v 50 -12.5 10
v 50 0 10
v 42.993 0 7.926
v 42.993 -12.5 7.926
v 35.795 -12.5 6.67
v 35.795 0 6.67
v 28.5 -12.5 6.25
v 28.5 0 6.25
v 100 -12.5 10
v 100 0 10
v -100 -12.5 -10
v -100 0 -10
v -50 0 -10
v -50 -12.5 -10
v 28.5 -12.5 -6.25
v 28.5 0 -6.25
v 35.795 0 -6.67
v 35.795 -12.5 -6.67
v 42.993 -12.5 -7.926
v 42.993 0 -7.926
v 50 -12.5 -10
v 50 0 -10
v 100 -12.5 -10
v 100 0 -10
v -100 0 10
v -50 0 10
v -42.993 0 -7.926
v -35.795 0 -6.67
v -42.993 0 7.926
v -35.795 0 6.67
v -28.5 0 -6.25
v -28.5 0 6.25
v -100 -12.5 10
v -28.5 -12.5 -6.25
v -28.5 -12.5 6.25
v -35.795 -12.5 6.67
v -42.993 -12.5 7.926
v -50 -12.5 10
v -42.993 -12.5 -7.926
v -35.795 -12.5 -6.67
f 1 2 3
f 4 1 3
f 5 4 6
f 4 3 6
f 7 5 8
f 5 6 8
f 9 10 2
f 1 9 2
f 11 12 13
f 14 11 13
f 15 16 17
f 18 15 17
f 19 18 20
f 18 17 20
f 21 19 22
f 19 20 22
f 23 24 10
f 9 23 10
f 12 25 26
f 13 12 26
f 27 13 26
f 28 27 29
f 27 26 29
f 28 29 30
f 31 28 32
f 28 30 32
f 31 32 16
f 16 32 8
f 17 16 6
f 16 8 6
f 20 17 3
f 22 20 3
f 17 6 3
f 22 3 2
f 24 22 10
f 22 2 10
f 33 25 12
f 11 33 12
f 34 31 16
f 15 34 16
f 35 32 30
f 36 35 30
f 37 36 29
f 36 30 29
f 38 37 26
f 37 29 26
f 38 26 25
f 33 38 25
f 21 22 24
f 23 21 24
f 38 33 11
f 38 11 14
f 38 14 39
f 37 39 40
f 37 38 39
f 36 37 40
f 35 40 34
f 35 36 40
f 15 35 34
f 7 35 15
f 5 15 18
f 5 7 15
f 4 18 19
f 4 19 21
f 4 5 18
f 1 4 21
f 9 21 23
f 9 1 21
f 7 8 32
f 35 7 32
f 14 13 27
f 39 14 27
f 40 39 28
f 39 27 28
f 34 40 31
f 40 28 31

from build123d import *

# Parameters (mm, degrees)
F1_DEPTH = 12.5


with BuildPart() as f1:
    # F0 (on Front) → F1 (new body)
    with BuildSketch(Plane.XZ):
        with BuildLine():
            Line((28.5, 6.25), (0, 6.25))
            Line((0, 6.25), (-28.5, 6.25))
            ThreePointArc((-28.5, 6.25), (-39.412292, 7.194524), (-50, 10))
            Line((-50, 10), (-100, 10))
            Line((-100, 10), (-100, 0))
            Line((-100, 0), (-100, -10))
            Line((-100, -10), (-50, -10))
            ThreePointArc((-50, -10), (-39.412292, -7.194524), (-28.5, -6.25))
            Line((-28.5, -6.25), (0, -6.25))
            Line((0, -6.25), (28.5, -6.25))
            ThreePointArc((28.5, -6.25), (39.412292, -7.194524), (50, -10))
            Line((50, -10), (100, -10))
            Line((100, -10), (100, 0))
            Line((100, 0), (100, 10))
            Line((100, 10), (50, 10))
            ThreePointArc((50, 10), (39.412292, 7.194524), (28.5, 6.25))
        make_face()
    extrude(amount=F1_DEPTH)


solid = f1.part
